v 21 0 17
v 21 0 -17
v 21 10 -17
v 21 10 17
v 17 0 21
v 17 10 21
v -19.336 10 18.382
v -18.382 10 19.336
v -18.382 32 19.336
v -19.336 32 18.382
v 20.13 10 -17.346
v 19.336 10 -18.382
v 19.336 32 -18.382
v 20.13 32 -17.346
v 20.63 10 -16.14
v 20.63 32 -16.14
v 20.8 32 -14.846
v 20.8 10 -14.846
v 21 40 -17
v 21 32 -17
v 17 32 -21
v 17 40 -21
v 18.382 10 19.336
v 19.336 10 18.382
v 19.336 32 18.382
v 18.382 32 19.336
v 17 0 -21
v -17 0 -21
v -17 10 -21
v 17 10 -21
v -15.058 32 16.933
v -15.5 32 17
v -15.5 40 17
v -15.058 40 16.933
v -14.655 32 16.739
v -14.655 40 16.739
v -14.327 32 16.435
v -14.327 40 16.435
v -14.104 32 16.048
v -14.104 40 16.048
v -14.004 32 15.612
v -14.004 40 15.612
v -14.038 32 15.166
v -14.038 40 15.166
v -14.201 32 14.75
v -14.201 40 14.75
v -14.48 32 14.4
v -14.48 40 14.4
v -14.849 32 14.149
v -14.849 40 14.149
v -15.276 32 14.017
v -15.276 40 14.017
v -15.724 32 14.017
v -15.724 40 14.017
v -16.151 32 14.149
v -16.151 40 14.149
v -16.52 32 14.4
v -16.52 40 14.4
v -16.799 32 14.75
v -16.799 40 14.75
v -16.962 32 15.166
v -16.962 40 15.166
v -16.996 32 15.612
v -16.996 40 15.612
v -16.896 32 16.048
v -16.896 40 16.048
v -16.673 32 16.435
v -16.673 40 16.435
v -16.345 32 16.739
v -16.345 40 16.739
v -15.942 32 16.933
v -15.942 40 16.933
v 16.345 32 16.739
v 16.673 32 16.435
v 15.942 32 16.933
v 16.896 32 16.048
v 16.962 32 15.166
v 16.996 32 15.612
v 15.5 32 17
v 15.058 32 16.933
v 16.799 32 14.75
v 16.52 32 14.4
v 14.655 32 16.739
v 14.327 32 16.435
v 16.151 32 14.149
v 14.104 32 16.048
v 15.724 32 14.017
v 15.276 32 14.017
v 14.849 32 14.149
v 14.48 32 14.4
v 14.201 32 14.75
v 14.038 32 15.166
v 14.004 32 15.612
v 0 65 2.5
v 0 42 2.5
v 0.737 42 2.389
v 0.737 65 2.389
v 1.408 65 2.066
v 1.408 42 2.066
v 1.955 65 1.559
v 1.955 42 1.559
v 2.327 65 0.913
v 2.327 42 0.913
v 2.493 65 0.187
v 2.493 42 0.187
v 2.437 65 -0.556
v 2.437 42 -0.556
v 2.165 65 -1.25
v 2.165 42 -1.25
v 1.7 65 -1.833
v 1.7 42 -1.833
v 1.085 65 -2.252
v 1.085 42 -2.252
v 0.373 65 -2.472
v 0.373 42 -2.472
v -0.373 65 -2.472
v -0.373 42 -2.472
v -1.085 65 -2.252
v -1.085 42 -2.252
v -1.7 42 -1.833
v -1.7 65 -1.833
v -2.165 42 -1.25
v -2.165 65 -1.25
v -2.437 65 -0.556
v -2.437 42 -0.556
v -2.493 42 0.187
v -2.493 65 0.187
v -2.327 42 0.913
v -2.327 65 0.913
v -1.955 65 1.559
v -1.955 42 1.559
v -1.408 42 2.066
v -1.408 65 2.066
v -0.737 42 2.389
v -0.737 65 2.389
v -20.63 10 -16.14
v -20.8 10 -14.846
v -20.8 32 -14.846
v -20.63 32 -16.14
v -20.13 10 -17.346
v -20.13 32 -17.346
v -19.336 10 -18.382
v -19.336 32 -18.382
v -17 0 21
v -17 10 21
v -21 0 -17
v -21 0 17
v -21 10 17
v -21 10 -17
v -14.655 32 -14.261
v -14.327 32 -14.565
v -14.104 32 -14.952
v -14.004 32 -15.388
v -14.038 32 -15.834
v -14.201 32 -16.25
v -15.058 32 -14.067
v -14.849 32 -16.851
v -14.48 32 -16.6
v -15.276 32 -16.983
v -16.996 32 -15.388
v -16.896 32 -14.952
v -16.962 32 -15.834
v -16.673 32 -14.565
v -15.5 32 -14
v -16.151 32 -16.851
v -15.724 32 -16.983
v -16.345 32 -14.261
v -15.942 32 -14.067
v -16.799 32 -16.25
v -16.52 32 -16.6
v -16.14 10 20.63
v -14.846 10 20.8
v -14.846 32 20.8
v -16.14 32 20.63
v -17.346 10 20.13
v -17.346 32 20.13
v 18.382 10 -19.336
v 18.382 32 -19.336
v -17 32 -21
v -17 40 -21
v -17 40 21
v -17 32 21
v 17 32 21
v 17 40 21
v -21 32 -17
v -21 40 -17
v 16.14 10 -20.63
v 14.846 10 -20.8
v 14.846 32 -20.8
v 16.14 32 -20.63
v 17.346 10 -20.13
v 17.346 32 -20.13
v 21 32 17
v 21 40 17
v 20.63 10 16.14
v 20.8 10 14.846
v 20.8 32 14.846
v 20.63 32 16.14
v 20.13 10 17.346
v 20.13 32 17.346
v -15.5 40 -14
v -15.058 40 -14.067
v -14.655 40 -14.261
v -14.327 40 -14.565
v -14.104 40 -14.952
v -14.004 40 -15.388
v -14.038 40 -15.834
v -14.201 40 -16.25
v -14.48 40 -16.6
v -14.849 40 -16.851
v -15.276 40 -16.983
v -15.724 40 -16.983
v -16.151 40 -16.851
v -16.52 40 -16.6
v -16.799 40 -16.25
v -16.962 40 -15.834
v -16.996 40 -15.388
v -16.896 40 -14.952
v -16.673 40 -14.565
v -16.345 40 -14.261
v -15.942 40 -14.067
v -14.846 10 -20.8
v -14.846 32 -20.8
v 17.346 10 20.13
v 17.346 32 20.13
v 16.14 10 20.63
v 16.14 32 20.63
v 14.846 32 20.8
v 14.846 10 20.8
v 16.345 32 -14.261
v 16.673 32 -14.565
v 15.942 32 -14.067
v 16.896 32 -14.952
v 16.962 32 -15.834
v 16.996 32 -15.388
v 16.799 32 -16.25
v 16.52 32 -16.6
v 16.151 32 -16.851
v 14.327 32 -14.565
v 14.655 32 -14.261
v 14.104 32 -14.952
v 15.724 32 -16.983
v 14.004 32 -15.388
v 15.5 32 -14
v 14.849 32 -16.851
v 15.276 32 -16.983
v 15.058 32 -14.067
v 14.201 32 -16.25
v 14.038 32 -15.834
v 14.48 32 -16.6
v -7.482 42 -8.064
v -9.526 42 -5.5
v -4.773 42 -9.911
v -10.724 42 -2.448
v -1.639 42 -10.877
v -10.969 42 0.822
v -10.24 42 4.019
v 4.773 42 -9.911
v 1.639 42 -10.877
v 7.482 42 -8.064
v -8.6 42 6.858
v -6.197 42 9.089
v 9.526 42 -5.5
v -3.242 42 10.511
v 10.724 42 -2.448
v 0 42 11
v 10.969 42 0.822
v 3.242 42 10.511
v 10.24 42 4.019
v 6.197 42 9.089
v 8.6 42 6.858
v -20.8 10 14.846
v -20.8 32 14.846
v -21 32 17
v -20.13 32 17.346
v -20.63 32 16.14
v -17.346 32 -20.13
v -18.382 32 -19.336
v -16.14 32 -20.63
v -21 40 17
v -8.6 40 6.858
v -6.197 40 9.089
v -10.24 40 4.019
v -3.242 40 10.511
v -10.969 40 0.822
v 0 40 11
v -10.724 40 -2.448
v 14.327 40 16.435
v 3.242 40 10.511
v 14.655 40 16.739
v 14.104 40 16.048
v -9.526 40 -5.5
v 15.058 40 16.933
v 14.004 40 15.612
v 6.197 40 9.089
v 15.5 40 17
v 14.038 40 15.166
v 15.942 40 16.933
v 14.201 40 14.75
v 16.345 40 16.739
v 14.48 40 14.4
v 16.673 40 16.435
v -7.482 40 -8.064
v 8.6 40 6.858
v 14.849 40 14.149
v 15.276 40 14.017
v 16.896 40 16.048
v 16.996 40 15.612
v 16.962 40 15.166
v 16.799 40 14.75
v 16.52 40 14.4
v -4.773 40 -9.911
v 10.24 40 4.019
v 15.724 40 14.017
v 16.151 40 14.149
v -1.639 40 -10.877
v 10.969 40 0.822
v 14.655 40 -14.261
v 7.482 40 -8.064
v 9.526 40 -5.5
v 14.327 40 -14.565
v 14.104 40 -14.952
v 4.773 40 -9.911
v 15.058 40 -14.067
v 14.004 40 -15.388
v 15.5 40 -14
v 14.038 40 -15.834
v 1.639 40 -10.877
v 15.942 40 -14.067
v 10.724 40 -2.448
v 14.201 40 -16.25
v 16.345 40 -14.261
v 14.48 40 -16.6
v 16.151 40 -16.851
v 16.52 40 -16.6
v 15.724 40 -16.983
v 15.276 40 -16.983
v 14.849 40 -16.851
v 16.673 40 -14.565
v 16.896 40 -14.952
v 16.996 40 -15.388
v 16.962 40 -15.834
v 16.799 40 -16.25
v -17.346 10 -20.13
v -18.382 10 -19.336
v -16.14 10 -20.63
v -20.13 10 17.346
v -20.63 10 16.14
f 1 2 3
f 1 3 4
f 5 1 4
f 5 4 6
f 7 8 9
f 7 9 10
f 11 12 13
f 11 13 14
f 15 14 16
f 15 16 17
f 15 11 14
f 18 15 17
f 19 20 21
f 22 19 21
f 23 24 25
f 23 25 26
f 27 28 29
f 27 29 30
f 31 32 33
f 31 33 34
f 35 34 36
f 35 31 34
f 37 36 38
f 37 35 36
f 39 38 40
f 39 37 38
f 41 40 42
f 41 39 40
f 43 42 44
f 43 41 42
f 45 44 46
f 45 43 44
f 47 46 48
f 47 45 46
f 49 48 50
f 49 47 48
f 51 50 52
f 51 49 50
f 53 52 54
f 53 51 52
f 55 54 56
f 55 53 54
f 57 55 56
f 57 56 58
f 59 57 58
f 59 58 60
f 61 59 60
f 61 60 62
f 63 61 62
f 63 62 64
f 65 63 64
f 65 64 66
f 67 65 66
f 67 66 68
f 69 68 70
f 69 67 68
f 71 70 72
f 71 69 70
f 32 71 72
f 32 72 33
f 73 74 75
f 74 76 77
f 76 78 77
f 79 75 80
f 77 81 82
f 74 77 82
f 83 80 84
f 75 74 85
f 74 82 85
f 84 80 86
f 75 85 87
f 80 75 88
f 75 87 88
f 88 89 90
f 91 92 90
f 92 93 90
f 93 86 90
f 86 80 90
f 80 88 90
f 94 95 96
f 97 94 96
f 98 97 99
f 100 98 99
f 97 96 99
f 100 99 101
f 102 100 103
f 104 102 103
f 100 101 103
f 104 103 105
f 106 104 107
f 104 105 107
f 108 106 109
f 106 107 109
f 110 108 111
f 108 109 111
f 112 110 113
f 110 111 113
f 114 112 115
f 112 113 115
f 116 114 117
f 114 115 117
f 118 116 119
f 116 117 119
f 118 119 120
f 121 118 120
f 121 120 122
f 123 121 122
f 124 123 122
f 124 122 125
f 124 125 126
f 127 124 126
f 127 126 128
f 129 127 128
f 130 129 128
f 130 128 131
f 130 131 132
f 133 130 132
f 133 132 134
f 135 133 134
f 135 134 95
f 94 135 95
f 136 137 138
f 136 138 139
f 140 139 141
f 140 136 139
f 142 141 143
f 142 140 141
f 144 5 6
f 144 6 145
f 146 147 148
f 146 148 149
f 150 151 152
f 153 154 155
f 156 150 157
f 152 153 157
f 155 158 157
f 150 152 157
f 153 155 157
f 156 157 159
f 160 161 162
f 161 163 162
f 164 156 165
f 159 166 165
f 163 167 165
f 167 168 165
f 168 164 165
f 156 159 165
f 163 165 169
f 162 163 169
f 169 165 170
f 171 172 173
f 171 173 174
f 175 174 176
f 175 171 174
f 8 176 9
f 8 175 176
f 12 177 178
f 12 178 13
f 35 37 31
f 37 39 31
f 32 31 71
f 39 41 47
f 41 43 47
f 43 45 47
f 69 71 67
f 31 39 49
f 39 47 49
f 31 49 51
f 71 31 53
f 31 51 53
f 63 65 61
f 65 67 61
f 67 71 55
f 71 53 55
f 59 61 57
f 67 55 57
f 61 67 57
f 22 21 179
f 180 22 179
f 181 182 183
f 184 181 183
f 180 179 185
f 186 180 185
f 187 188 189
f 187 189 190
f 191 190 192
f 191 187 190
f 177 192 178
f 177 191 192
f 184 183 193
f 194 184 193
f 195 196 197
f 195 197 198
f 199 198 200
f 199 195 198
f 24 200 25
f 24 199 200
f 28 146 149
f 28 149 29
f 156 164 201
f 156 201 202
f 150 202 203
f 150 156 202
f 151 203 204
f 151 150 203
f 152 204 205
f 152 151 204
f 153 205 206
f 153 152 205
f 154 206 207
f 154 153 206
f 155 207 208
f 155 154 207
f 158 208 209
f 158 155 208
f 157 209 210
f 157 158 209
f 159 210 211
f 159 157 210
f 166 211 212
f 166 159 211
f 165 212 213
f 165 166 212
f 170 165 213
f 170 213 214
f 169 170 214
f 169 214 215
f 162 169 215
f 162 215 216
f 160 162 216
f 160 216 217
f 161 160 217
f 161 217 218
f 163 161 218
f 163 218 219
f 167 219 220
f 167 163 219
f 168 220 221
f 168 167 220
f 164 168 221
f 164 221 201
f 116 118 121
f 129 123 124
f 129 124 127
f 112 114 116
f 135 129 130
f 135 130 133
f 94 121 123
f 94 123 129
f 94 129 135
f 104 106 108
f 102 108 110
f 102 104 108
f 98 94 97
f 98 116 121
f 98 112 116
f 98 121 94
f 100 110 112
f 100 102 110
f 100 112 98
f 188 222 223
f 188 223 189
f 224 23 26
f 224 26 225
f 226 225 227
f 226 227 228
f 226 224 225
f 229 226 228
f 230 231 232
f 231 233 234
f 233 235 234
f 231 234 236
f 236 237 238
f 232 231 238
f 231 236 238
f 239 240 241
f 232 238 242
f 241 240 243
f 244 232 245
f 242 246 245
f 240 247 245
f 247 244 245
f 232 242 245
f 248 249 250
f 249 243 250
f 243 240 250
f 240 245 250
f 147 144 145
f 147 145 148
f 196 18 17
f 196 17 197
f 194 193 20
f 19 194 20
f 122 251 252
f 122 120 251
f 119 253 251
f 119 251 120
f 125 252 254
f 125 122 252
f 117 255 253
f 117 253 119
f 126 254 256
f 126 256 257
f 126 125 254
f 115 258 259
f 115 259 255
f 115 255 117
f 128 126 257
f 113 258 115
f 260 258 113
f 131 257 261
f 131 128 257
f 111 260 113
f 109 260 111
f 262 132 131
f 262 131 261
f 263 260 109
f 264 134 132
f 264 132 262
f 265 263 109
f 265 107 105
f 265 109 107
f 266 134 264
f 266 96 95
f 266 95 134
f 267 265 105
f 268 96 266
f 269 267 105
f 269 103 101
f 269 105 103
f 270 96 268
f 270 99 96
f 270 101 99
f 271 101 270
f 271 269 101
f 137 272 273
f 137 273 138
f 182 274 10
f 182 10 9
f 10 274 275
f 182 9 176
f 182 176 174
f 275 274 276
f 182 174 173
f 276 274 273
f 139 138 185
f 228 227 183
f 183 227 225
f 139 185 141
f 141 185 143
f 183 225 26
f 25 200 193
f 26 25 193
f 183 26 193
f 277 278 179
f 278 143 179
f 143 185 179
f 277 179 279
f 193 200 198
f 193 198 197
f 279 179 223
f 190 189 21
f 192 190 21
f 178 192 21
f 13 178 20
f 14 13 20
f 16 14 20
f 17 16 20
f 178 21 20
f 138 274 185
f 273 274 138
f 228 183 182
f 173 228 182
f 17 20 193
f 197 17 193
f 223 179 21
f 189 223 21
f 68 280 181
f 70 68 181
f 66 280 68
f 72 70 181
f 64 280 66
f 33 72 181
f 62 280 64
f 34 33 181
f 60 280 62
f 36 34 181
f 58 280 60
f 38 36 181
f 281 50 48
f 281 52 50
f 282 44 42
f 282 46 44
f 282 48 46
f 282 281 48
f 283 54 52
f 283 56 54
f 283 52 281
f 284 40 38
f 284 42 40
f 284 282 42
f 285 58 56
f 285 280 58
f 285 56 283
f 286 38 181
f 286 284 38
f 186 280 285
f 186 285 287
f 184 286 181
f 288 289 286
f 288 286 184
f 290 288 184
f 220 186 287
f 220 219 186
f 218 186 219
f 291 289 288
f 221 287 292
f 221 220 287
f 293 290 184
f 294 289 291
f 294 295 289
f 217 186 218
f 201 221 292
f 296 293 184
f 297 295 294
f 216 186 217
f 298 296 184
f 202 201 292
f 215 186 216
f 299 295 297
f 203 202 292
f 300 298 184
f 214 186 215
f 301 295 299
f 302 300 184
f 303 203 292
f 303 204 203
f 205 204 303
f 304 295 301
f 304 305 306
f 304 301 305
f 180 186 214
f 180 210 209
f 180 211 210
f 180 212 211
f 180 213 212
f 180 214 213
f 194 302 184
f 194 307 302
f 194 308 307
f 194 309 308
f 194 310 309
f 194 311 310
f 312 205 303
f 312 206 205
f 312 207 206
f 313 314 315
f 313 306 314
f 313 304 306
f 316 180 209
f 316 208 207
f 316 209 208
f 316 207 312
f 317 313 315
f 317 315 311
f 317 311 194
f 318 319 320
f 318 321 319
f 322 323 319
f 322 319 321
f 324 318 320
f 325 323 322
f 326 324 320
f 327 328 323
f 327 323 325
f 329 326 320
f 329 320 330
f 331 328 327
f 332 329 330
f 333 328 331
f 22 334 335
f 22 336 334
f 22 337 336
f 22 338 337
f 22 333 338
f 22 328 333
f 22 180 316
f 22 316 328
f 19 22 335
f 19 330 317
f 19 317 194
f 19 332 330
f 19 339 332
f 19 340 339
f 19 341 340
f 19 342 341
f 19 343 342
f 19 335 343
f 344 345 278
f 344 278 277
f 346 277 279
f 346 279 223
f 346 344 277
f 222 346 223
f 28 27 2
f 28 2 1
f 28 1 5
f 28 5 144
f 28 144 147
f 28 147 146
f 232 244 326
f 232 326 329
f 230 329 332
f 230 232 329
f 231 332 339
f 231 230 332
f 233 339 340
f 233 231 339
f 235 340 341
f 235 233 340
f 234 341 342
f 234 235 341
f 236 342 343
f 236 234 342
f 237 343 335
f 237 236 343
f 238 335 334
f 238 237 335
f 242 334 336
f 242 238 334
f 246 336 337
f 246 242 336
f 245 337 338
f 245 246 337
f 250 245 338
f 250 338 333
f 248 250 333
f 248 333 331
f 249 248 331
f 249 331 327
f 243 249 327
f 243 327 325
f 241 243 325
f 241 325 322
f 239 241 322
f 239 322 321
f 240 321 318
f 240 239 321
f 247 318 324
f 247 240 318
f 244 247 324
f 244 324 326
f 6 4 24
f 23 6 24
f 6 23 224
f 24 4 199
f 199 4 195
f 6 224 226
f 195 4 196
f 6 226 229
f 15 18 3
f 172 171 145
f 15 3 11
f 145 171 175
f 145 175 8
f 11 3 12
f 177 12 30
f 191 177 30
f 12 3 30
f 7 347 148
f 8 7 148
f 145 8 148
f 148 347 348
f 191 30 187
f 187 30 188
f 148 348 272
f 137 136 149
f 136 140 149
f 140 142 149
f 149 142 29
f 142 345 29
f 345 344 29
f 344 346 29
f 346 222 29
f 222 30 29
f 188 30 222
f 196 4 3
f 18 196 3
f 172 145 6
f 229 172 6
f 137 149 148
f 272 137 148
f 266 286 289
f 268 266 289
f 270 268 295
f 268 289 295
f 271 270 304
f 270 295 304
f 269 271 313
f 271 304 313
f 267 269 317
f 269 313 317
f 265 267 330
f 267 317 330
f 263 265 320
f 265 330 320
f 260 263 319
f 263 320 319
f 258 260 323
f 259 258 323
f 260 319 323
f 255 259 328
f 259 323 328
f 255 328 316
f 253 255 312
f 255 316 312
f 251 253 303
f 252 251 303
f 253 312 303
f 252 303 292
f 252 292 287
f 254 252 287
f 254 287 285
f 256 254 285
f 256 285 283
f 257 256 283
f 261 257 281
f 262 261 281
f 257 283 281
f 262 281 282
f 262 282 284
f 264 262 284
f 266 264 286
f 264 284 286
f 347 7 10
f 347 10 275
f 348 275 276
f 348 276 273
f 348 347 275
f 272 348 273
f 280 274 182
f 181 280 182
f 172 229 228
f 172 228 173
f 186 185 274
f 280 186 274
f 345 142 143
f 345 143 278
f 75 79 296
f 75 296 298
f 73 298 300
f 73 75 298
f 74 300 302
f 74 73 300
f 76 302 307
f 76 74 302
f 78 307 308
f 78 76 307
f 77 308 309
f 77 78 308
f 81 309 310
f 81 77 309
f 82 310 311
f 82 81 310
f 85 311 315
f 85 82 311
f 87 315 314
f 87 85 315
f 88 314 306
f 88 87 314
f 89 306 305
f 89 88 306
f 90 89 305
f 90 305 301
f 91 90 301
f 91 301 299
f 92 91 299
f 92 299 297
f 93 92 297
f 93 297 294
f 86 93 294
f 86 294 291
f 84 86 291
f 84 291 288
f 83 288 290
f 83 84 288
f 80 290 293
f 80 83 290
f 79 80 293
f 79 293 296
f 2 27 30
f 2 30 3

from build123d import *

# Parameters (mm, degrees)
BOSS_EXTRUDE1_DEPTH = 10
BOSS_EXTRUDE2_DEPTH = 22
SKETCH3_R           = 1.5
BOSS_EXTRUDE3_DEPTH = 8
SKETCH4_R           = 11
SKETCH4_R_2         = 2.5
BOSS_EXTRUDE4_DEPTH = 2
SKETCH6_R           = 2.5
BOSS_EXTRUDE5_DEPTH = 25


with BuildPart() as part:
    # Sketch1 → Boss-Extrude1 (new body)
    with BuildSketch(Plane(origin=(0, 0, 0), x_dir=(1, 0, 0), z_dir=(0, 1, 0))):
        Polygon((-21, 17), (-17, 21), (17, 21), (21, 17), (21, -17), (17, -21), (-17, -21), (-21, -17), align=None)
    extrude(amount=BOSS_EXTRUDE1_DEPTH)

    # Sketch2 → Boss-Extrude2 (add)
    with BuildSketch(Plane(origin=(0, 10, 0), x_dir=(1, 0, 0), z_dir=(0, 1, 0))):
        with BuildLine():
            Line((-19.335533906, 18.381623382), (-18.381623382, 19.335533906))
            ThreePointArc((-18.381623382, 19.335533906), (-16.759506637, 20.419397663), (-14.846089476, 20.8))
            Line((-14.846089476, 20.8), (14.846089476, 20.8))
            ThreePointArc((14.846089476, 20.8), (16.759506637, 20.419397663), (18.381623382, 19.335533906))
            Line((18.381623382, 19.335533906), (19.335533906, 18.381623382))
            ThreePointArc((19.335533906, 18.381623382), (20.419397663, 16.759506637), (20.8, 14.846089476))
            Line((20.8, 14.846089476), (20.8, -14.846089476))
            ThreePointArc((20.8, -14.846089476), (20.419397663, -16.759506637), (19.335533906, -18.381623382))
            Line((19.335533906, -18.381623382), (18.381623382, -19.335533906))
            ThreePointArc((18.381623382, -19.335533906), (16.759506637, -20.419397663), (14.846089476, -20.8))
            Line((14.846089476, -20.8), (-14.846089476, -20.8))
            ThreePointArc((-14.846089476, -20.8), (-16.759506637, -20.419397663), (-18.381623382, -19.335533906))
            Line((-18.381623382, -19.335533906), (-19.335533906, -18.381623382))
            ThreePointArc((-19.335533906, -18.381623382), (-20.419397663, -16.759506637), (-20.8, -14.846089476))
            Line((-20.8, -14.846089476), (-20.8, 14.846089476))
            ThreePointArc((-20.8, 14.846089476), (-20.419397663, 16.759506637), (-19.335533906, 18.381623382))
        make_face()
    extrude(amount=BOSS_EXTRUDE2_DEPTH)

    # Sketch3 → Boss-Extrude3 (add)
    # profile 1 of 2: a face of its own
    with BuildSketch(Plane(origin=(0, 32, 0), x_dir=(1, 0, 0), z_dir=(0, 1, 0))):
        Polygon((-17, 21), (-21, 17), (-21, -17), (-17, -21), (17, -21), (21, -17), (21, 17), (17, 21), align=None)
        with BuildLine():
            ThreePointArc((-14.846089476, 20.8), (-16.759506637, 20.419397663), (-18.381623382, 19.335533906))
            Line((-18.381623382, 19.335533906), (-19.335533906, 18.381623382))
            ThreePointArc((-19.335533906, 18.381623382), (-20.419397663, 16.759506637), (-20.8, 14.846089476))
            Line((-20.8, 14.846089476), (-20.8, -14.846089476))
            ThreePointArc((-20.8, -14.846089476), (-20.419397663, -16.759506637), (-19.335533906, -18.381623382))
            Line((-19.335533906, -18.381623382), (-18.381623382, -19.335533906))
            ThreePointArc((-18.381623382, -19.335533906), (-16.759506637, -20.419397663), (-14.846089476, -20.8))
            Line((-14.846089476, -20.8), (14.846089476, -20.8))
            ThreePointArc((14.846089476, -20.8), (16.759506637, -20.419397663), (18.381623382, -19.335533906))
            Line((18.381623382, -19.335533906), (19.335533906, -18.381623382))
            ThreePointArc((19.335533906, -18.381623382), (20.419397663, -16.759506637), (20.8, -14.846089476))
            Line((20.8, -14.846089476), (20.8, 14.846089476))
            ThreePointArc((20.8, 14.846089476), (20.419397663, 16.759506637), (19.335533906, 18.381623382))
            Line((19.335533906, 18.381623382), (18.381623382, 19.335533906))
            ThreePointArc((18.381623382, 19.335533906), (16.759506637, 20.419397663), (14.846089476, 20.8))
            Line((14.846089476, 20.8), (-14.846089476, 20.8))
        make_face(mode=Mode.SUBTRACT)
    # profile 2 of 2: a face of its own
    with BuildSketch(Plane(origin=(0, 32, 0), x_dir=(1, 0, 0), z_dir=(0, 1, 0))):
        with BuildLine():
            Line((14.846089476, 20.8), (-14.846089476, 20.8))
            ThreePointArc((-14.846089476, 20.8), (-16.759506637, 20.419397663), (-18.381623382, 19.335533906))
            Line((-18.381623382, 19.335533906), (-19.335533906, 18.381623382))
            ThreePointArc((-19.335533906, 18.381623382), (-20.419397663, 16.759506637), (-20.8, 14.846089476))
            Line((-20.8, 14.846089476), (-20.8, -14.846089476))
            ThreePointArc((-20.8, -14.846089476), (-20.419397663, -16.759506637), (-19.335533906, -18.381623382))
            Line((-19.335533906, -18.381623382), (-18.381623382, -19.335533906))
            ThreePointArc((-18.381623382, -19.335533906), (-16.759506637, -20.419397663), (-14.846089476, -20.8))
            Line((-14.846089476, -20.8), (14.846089476, -20.8))
            ThreePointArc((14.846089476, -20.8), (16.759506637, -20.419397663), (18.381623382, -19.335533906))
            Line((18.381623382, -19.335533906), (19.335533906, -18.381623382))
            ThreePointArc((19.335533906, -18.381623382), (20.419397663, -16.759506637), (20.8, -14.846089476))
            Line((20.8, -14.846089476), (20.8, 14.846089476))
            ThreePointArc((20.8, 14.846089476), (20.419397663, 16.759506637), (19.335533906, 18.381623382))
            Line((19.335533906, 18.381623382), (18.381623382, 19.335533906))
            ThreePointArc((18.381623382, 19.335533906), (16.759506637, 20.419397663), (14.846089476, 20.8))
        make_face()
        with Locations(Location((15.5, 15.5, 0), (0, 0, 270))):
            Circle(SKETCH3_R, mode=Mode.SUBTRACT)
        with Locations(Location((15.5, -15.5, 0), (0, 0, 270))):
            Circle(SKETCH3_R, mode=Mode.SUBTRACT)
        with Locations(Location((-15.5, 15.5, 0), (0, 0, 270))):
            Circle(SKETCH3_R, mode=Mode.SUBTRACT)
        with Locations(Location((-15.5, -15.5, 0), (0, 0, 270))):
            Circle(SKETCH3_R, mode=Mode.SUBTRACT)
    extrude(amount=BOSS_EXTRUDE3_DEPTH)

    # Sketch4 → Boss-Extrude4 (add)
    with BuildSketch(Plane(origin=(0, 40, 0), x_dir=(1, 0, 0), z_dir=(0, 1, 0))):
        with Locations(Location((0, 0, 0), (0, 0, 270))):
            Circle(SKETCH4_R)
        with Locations(Location((0, 0, 0), (0, 0, 270))):
            Circle(SKETCH4_R_2, mode=Mode.SUBTRACT)
    extrude(amount=BOSS_EXTRUDE4_DEPTH)

    # Sketch6 → Boss-Extrude5 (add)
    with BuildSketch(Plane(origin=(0, 40, 0), x_dir=(1, 0, 0), z_dir=(0, 1, 0))):
        with Locations(Location((0, 0, 0), (0, 0, 270))):
            Circle(SKETCH6_R)
    extrude(amount=BOSS_EXTRUDE5_DEPTH)


solid = part.part
